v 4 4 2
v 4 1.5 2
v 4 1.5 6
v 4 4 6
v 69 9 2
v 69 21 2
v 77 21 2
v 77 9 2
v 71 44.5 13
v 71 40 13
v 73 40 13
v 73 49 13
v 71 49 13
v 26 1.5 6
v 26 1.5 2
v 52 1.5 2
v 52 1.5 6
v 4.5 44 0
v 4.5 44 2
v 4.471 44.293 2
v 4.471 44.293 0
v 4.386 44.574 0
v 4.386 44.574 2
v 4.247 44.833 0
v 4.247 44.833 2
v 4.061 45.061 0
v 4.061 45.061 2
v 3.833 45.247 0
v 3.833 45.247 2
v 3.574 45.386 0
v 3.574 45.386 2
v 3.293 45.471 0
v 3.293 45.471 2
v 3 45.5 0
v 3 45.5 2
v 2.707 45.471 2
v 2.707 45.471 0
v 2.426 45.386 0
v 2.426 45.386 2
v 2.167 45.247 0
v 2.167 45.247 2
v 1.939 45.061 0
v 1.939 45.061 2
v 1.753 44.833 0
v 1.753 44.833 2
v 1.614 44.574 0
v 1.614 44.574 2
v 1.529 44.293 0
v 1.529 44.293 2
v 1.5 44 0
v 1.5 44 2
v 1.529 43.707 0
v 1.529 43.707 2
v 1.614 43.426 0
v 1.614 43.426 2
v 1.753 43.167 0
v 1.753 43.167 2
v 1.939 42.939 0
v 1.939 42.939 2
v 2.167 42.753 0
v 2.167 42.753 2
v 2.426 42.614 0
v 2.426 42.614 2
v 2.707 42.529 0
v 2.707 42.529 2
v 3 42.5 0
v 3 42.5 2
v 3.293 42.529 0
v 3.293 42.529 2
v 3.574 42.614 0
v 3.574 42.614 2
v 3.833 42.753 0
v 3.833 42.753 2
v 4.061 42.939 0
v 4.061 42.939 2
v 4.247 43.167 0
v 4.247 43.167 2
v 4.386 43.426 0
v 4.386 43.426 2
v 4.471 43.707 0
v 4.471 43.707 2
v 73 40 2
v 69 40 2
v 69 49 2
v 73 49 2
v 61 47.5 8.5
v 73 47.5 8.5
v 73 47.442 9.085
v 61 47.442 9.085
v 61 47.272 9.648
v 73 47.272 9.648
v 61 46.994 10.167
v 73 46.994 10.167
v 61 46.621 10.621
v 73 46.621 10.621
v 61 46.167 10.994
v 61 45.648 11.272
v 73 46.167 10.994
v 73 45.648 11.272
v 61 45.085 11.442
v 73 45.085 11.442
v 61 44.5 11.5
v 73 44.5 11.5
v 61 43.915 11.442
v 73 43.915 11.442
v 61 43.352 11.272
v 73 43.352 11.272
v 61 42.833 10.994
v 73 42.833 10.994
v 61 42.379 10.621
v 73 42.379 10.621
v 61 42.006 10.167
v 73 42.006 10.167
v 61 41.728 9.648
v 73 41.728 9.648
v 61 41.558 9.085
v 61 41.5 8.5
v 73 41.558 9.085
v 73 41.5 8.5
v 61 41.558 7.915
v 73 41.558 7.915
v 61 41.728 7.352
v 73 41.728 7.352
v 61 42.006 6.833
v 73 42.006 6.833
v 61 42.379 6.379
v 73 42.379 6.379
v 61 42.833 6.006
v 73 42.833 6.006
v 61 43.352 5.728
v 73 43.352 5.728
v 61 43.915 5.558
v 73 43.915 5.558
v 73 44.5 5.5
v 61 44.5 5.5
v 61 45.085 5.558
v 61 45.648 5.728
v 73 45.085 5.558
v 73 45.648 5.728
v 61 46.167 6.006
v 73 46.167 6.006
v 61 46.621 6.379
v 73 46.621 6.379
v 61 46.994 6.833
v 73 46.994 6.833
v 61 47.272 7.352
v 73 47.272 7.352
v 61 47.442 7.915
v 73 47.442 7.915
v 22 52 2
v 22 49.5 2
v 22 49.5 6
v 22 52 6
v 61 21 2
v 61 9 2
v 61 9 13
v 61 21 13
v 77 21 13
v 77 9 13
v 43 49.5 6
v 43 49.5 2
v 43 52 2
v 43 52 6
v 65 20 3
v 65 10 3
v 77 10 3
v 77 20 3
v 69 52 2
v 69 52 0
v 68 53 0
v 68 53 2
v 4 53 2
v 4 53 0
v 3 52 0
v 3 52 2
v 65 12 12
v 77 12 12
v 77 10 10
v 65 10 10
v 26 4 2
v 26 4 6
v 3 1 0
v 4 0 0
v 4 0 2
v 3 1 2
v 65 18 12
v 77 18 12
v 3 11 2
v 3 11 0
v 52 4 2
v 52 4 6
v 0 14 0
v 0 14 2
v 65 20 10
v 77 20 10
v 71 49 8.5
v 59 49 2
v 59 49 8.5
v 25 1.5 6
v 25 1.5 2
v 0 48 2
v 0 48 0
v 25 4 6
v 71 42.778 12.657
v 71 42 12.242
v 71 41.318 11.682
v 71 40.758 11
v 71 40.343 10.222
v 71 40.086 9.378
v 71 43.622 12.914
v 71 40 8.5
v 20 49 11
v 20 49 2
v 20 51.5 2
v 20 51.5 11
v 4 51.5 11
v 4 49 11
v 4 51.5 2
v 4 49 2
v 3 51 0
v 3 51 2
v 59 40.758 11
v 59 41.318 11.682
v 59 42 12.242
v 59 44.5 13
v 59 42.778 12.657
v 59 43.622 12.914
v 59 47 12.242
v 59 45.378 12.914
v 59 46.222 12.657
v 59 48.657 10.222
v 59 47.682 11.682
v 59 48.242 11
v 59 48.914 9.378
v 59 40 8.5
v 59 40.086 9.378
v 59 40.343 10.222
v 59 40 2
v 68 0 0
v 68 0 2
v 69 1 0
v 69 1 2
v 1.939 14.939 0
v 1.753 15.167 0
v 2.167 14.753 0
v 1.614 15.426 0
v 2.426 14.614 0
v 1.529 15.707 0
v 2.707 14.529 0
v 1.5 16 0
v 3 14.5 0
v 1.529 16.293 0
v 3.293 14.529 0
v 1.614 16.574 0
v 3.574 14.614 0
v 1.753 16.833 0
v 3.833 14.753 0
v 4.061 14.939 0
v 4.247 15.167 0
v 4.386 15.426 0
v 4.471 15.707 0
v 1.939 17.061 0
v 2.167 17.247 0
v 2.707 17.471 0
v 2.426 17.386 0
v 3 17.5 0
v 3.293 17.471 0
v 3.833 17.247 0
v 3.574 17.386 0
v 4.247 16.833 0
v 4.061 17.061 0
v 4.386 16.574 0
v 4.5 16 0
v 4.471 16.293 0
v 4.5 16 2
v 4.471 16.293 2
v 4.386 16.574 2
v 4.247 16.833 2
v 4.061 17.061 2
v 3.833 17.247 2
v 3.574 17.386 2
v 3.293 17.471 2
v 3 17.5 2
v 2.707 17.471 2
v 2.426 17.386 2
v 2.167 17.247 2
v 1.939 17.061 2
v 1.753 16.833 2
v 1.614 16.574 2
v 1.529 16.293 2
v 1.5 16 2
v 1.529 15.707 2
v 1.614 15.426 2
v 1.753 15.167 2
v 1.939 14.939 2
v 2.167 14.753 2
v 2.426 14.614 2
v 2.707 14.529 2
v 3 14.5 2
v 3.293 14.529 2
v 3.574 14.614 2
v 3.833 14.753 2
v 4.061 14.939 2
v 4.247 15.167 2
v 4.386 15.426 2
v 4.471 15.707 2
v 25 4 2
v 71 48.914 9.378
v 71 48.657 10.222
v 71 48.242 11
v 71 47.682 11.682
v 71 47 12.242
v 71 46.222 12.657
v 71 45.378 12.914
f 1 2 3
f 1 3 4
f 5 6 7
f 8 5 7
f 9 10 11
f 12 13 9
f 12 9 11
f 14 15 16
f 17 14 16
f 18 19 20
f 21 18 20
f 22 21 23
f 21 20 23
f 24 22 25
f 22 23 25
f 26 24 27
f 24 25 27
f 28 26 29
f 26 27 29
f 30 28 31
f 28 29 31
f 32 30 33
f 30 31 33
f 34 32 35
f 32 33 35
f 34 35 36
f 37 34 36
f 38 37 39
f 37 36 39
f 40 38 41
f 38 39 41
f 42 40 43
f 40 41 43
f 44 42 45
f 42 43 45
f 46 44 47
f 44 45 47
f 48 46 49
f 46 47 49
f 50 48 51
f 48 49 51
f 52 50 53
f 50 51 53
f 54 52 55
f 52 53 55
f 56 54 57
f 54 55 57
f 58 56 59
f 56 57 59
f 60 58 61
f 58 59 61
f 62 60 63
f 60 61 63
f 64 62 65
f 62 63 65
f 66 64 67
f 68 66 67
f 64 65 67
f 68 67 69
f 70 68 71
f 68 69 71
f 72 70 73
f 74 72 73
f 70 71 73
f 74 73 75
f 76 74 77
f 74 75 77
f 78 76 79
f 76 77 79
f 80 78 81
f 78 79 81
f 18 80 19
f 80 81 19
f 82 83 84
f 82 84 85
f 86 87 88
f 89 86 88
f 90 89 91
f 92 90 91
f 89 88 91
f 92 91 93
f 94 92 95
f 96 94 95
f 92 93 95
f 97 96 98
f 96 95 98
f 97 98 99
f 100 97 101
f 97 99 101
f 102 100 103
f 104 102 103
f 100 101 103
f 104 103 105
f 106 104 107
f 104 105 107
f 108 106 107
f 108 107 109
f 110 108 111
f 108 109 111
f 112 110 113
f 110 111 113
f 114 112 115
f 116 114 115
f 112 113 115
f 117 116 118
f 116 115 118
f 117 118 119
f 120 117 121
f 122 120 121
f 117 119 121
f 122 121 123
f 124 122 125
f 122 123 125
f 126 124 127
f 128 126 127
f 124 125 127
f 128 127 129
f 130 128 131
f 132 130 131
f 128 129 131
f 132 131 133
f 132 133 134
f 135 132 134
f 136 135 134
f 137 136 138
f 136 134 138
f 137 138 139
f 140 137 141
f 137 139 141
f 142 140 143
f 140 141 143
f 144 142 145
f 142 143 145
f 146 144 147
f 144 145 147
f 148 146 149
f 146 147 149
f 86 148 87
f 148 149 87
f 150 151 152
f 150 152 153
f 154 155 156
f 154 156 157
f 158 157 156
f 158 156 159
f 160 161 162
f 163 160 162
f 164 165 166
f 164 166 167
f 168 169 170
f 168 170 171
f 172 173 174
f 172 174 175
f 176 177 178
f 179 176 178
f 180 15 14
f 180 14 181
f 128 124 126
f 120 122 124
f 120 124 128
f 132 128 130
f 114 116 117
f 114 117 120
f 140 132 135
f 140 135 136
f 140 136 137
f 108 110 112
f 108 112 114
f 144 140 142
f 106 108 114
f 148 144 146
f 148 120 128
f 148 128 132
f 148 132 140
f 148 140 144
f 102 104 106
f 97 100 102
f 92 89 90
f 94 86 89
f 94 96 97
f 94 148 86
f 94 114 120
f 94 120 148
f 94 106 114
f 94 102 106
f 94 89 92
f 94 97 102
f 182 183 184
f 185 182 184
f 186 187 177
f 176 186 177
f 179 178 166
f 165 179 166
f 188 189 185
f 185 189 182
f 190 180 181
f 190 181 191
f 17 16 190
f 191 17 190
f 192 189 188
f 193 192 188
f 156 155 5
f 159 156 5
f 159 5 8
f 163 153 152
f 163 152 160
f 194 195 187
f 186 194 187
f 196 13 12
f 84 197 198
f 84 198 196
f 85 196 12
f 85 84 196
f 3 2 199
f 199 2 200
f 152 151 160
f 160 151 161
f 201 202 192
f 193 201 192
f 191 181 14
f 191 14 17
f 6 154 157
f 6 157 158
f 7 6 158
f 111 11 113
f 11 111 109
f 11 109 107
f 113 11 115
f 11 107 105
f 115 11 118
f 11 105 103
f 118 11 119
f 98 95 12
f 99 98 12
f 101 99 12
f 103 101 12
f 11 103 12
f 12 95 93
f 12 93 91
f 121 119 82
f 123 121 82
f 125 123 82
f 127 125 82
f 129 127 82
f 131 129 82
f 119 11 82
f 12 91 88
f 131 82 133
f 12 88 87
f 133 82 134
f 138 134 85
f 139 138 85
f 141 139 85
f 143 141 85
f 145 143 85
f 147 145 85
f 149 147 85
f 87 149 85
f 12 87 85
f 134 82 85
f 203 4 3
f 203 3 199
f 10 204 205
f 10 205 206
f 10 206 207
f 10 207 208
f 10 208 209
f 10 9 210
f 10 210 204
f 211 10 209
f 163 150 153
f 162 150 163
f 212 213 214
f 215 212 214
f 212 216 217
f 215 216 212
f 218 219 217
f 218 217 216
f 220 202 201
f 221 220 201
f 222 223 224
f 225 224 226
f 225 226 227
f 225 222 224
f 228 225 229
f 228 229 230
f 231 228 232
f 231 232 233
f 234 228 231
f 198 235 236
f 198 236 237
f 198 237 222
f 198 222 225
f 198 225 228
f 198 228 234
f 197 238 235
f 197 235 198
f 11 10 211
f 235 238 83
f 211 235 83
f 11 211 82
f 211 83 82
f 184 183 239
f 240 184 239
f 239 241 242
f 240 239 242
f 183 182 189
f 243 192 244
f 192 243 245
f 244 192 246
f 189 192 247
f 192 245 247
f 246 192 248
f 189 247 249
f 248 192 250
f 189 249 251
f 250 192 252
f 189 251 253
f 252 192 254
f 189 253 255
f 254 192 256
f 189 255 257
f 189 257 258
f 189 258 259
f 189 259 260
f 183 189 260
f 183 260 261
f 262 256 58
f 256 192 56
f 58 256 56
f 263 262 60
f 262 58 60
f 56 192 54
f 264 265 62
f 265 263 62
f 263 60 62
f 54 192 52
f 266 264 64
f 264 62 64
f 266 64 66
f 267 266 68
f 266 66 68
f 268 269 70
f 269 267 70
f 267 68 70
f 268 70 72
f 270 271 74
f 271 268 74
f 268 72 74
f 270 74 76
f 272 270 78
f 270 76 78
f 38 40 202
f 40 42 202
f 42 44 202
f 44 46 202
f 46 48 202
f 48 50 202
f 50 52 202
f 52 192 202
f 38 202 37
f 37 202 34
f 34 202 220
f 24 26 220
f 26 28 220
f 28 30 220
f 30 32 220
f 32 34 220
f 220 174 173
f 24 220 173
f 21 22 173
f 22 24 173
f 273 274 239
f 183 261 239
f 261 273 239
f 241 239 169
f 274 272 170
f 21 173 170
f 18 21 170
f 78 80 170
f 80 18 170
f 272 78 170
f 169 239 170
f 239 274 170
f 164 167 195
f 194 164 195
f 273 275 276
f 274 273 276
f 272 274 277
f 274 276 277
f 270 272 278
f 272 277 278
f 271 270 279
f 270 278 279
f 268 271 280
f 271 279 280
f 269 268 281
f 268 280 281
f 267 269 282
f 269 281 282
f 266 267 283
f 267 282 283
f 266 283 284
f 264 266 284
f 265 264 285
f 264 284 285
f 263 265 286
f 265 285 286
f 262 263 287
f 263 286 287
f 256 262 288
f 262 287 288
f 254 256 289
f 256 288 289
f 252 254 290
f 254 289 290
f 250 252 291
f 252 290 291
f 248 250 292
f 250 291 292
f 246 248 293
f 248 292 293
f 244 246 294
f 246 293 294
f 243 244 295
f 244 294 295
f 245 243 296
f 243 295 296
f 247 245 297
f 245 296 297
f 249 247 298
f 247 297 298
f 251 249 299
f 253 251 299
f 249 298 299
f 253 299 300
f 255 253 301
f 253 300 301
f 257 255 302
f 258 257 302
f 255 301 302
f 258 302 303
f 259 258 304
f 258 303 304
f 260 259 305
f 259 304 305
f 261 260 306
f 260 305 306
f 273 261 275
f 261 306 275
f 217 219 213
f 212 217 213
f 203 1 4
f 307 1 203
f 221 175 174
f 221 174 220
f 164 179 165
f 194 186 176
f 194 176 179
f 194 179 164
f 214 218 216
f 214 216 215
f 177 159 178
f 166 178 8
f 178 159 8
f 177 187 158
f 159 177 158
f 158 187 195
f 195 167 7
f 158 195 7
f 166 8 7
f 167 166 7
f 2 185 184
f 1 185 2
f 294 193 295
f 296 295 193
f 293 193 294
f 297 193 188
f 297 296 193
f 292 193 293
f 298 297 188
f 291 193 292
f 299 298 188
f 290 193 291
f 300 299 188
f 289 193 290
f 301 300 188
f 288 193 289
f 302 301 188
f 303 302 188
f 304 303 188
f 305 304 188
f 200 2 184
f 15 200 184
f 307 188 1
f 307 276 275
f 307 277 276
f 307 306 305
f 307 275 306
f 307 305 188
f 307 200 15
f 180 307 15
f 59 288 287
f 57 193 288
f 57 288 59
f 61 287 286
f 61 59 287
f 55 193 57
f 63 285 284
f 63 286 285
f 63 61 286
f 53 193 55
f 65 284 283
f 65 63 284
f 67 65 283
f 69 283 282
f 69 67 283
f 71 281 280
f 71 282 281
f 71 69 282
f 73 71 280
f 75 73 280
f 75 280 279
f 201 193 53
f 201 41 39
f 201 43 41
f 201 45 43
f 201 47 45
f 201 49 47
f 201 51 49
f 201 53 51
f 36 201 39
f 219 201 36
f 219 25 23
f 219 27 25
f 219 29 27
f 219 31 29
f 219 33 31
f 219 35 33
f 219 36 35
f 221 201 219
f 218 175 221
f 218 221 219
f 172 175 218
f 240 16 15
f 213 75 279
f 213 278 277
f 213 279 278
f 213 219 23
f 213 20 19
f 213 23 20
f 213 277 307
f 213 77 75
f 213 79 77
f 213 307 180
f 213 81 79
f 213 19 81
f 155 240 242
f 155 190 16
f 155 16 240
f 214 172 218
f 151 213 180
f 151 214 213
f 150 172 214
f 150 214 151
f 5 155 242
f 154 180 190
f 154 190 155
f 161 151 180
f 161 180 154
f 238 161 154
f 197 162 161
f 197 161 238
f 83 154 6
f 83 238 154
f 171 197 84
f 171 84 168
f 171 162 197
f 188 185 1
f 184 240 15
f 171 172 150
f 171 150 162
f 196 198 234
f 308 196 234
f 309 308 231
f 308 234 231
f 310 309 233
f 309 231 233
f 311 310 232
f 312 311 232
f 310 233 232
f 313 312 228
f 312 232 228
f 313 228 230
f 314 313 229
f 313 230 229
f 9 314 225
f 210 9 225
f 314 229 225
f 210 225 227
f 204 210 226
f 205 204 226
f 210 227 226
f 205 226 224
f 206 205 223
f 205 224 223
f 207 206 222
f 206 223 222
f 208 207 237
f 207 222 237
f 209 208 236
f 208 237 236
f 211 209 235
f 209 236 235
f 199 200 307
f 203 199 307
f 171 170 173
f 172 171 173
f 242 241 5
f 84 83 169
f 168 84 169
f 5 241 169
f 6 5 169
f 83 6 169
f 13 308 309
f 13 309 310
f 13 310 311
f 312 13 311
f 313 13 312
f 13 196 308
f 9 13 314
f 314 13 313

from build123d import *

# Parameters (mm, degrees)
F1_DEPTH  = 2
F2_W      = 16
F2_H      = 12
F3_DEPTH  = 11
F4_W      = 14
F4_H      = 9
F5_DEPTH  = 11
F6_W      = 16
F6_H      = 2.5
F7_DEPTH  = 9
F8_W      = 21
F8_H      = 2.5
F9_DEPTH  = 4
F10_W     = 21
F10_H     = 2.5
F10_W_2   = 26
F11_DEPTH = 4
F13_DEPTH = 12
F14_R     = 3
F15_DEPTH = 12
F17_DEPTH = 12
F18_SIZE2 = 2.99999
F18_SIZE  = 2.99999
F19_SIZE2 = 1
F19_SIZE  = 1
F20_R     = 1.5
F21_DEPTH = 2


# Not quite as in the source:
# - a fillet or chamfer is up to 0.001 mm smaller than in the source, because OpenCascade refuses the exact size


with BuildPart() as f1:
    # F0 (on Top) → F1 (new body)
    with BuildSketch(Plane.XY):
        Polygon((3, 11), (3, 0), (69, 0), (69, 53), (3, 53), (3, 51), (0, 51), (0, 11), align=None)
    extrude(amount=F1_DEPTH)

    # F2 (on face) → F3 (join)
    with BuildSketch(Plane.XY.offset(2)):
        with Locations((69, 15)):
            Rectangle(F2_W, F2_H)
    extrude(amount=F3_DEPTH)

    # F4 (on face) → F5 (join)
    with BuildSketch(Plane.XY.offset(2)):
        with Locations((66, 44.5)):
            Rectangle(F4_W, F4_H)
    extrude(amount=F5_DEPTH)

    # F6 (on face) → F7 (join)
    with BuildSketch(Plane.XY.offset(2)):
        with Locations((12, 50.25)):
            Rectangle(F6_W, F6_H)
    extrude(amount=F7_DEPTH)

    # F8 (on face) → F9 (join)
    with BuildSketch(Plane.XY.offset(2)):
        with Locations((32.5, 50.75)):
            Rectangle(F8_W, F8_H)
    extrude(amount=F9_DEPTH)

    # F10 (on face) → F11 (join)
    with BuildSketch(Plane.XY.offset(2)):
        with Locations((14.5, 2.75)):
            Rectangle(F10_W, F10_H)
        with Locations((39, 2.75)):
            Rectangle(F10_W_2, F10_H)
    extrude(amount=F11_DEPTH)

    # F12 (on face) → F13 (cut)
    with BuildSketch(Plane(origin=(59, 0, 0), x_dir=(0, -1, 0), z_dir=(-1, 0, 0))):
        with BuildLine():
            ThreePointArc((-49, 8.5), (-44.5, 13), (-40, 8.5))
            Line((-40, 8.5), (-38.6329554021, 9.580289945))
            Line((-38.6329554021, 9.580289945), (-38.187738508, 14.0570942312))
            Line((-38.187738508, 14.0570942312), (-42.2688946128, 14.7991068661))
            Line((-42.2688946128, 14.7991068661), (-51.2474328279, 13.8839585707))
            Line((-51.2474328279, 13.8839585707), (-49, 8.5))
        make_face()
        Polygon((-40, 13), (-40, 8.5), (-38.6329554021, 9.580289945), (-38.187738508, 14.0570942312), (-42.2688946128, 14.7991068661), (-51.2474328279, 13.8839585707), (-49, 8.5), (-49, 13), (-44.5, 13), align=None)
    extrude(amount=-F13_DEPTH, mode=Mode.SUBTRACT)

    # F14 (on face) → F15 (cut)
    with BuildSketch(Plane.YZ.offset(73)):
        with Locations((44.5, 8.5)):
            Circle(F14_R)
    extrude(amount=-F15_DEPTH, mode=Mode.SUBTRACT)

    # F16 (on face) → F17 (cut)
    with BuildSketch(Plane.YZ.offset(77)):
        Polygon((18, 12), (12, 12), (10, 10), (10, 3), (20, 3), (20, 10), align=None)
    extrude(amount=-F17_DEPTH, mode=Mode.SUBTRACT)

    # F18 (size 3 and 3 in the source; OpenCascade refuses exactly that, so slightly less here)
    f18_edges = [f1.edges().sort_by_distance(p)[0] for p in [
        (0, 51, 1),
        (0, 11, 1),
    ]]
    chamfer(f18_edges, length=F18_SIZE, length2=F18_SIZE2)

    # F19
    f19_edges = [f1.edges().sort_by_distance(p)[0] for p in [
        (3, 0, 1),
        (69, 0, 1),
        (69, 53, 1),
        (3, 53, 1),
    ]]
    chamfer(f19_edges, length=F19_SIZE, length2=F19_SIZE2)

    # F20 (on face) → F21 (cut)
    with BuildSketch(Plane.XY.offset(2)):
        with Locations((3, 16)):
            Circle(F20_R)
        with Locations((3, 44)):
            Circle(F20_R)
    extrude(amount=-F21_DEPTH, mode=Mode.SUBTRACT)


solid = f1.part
